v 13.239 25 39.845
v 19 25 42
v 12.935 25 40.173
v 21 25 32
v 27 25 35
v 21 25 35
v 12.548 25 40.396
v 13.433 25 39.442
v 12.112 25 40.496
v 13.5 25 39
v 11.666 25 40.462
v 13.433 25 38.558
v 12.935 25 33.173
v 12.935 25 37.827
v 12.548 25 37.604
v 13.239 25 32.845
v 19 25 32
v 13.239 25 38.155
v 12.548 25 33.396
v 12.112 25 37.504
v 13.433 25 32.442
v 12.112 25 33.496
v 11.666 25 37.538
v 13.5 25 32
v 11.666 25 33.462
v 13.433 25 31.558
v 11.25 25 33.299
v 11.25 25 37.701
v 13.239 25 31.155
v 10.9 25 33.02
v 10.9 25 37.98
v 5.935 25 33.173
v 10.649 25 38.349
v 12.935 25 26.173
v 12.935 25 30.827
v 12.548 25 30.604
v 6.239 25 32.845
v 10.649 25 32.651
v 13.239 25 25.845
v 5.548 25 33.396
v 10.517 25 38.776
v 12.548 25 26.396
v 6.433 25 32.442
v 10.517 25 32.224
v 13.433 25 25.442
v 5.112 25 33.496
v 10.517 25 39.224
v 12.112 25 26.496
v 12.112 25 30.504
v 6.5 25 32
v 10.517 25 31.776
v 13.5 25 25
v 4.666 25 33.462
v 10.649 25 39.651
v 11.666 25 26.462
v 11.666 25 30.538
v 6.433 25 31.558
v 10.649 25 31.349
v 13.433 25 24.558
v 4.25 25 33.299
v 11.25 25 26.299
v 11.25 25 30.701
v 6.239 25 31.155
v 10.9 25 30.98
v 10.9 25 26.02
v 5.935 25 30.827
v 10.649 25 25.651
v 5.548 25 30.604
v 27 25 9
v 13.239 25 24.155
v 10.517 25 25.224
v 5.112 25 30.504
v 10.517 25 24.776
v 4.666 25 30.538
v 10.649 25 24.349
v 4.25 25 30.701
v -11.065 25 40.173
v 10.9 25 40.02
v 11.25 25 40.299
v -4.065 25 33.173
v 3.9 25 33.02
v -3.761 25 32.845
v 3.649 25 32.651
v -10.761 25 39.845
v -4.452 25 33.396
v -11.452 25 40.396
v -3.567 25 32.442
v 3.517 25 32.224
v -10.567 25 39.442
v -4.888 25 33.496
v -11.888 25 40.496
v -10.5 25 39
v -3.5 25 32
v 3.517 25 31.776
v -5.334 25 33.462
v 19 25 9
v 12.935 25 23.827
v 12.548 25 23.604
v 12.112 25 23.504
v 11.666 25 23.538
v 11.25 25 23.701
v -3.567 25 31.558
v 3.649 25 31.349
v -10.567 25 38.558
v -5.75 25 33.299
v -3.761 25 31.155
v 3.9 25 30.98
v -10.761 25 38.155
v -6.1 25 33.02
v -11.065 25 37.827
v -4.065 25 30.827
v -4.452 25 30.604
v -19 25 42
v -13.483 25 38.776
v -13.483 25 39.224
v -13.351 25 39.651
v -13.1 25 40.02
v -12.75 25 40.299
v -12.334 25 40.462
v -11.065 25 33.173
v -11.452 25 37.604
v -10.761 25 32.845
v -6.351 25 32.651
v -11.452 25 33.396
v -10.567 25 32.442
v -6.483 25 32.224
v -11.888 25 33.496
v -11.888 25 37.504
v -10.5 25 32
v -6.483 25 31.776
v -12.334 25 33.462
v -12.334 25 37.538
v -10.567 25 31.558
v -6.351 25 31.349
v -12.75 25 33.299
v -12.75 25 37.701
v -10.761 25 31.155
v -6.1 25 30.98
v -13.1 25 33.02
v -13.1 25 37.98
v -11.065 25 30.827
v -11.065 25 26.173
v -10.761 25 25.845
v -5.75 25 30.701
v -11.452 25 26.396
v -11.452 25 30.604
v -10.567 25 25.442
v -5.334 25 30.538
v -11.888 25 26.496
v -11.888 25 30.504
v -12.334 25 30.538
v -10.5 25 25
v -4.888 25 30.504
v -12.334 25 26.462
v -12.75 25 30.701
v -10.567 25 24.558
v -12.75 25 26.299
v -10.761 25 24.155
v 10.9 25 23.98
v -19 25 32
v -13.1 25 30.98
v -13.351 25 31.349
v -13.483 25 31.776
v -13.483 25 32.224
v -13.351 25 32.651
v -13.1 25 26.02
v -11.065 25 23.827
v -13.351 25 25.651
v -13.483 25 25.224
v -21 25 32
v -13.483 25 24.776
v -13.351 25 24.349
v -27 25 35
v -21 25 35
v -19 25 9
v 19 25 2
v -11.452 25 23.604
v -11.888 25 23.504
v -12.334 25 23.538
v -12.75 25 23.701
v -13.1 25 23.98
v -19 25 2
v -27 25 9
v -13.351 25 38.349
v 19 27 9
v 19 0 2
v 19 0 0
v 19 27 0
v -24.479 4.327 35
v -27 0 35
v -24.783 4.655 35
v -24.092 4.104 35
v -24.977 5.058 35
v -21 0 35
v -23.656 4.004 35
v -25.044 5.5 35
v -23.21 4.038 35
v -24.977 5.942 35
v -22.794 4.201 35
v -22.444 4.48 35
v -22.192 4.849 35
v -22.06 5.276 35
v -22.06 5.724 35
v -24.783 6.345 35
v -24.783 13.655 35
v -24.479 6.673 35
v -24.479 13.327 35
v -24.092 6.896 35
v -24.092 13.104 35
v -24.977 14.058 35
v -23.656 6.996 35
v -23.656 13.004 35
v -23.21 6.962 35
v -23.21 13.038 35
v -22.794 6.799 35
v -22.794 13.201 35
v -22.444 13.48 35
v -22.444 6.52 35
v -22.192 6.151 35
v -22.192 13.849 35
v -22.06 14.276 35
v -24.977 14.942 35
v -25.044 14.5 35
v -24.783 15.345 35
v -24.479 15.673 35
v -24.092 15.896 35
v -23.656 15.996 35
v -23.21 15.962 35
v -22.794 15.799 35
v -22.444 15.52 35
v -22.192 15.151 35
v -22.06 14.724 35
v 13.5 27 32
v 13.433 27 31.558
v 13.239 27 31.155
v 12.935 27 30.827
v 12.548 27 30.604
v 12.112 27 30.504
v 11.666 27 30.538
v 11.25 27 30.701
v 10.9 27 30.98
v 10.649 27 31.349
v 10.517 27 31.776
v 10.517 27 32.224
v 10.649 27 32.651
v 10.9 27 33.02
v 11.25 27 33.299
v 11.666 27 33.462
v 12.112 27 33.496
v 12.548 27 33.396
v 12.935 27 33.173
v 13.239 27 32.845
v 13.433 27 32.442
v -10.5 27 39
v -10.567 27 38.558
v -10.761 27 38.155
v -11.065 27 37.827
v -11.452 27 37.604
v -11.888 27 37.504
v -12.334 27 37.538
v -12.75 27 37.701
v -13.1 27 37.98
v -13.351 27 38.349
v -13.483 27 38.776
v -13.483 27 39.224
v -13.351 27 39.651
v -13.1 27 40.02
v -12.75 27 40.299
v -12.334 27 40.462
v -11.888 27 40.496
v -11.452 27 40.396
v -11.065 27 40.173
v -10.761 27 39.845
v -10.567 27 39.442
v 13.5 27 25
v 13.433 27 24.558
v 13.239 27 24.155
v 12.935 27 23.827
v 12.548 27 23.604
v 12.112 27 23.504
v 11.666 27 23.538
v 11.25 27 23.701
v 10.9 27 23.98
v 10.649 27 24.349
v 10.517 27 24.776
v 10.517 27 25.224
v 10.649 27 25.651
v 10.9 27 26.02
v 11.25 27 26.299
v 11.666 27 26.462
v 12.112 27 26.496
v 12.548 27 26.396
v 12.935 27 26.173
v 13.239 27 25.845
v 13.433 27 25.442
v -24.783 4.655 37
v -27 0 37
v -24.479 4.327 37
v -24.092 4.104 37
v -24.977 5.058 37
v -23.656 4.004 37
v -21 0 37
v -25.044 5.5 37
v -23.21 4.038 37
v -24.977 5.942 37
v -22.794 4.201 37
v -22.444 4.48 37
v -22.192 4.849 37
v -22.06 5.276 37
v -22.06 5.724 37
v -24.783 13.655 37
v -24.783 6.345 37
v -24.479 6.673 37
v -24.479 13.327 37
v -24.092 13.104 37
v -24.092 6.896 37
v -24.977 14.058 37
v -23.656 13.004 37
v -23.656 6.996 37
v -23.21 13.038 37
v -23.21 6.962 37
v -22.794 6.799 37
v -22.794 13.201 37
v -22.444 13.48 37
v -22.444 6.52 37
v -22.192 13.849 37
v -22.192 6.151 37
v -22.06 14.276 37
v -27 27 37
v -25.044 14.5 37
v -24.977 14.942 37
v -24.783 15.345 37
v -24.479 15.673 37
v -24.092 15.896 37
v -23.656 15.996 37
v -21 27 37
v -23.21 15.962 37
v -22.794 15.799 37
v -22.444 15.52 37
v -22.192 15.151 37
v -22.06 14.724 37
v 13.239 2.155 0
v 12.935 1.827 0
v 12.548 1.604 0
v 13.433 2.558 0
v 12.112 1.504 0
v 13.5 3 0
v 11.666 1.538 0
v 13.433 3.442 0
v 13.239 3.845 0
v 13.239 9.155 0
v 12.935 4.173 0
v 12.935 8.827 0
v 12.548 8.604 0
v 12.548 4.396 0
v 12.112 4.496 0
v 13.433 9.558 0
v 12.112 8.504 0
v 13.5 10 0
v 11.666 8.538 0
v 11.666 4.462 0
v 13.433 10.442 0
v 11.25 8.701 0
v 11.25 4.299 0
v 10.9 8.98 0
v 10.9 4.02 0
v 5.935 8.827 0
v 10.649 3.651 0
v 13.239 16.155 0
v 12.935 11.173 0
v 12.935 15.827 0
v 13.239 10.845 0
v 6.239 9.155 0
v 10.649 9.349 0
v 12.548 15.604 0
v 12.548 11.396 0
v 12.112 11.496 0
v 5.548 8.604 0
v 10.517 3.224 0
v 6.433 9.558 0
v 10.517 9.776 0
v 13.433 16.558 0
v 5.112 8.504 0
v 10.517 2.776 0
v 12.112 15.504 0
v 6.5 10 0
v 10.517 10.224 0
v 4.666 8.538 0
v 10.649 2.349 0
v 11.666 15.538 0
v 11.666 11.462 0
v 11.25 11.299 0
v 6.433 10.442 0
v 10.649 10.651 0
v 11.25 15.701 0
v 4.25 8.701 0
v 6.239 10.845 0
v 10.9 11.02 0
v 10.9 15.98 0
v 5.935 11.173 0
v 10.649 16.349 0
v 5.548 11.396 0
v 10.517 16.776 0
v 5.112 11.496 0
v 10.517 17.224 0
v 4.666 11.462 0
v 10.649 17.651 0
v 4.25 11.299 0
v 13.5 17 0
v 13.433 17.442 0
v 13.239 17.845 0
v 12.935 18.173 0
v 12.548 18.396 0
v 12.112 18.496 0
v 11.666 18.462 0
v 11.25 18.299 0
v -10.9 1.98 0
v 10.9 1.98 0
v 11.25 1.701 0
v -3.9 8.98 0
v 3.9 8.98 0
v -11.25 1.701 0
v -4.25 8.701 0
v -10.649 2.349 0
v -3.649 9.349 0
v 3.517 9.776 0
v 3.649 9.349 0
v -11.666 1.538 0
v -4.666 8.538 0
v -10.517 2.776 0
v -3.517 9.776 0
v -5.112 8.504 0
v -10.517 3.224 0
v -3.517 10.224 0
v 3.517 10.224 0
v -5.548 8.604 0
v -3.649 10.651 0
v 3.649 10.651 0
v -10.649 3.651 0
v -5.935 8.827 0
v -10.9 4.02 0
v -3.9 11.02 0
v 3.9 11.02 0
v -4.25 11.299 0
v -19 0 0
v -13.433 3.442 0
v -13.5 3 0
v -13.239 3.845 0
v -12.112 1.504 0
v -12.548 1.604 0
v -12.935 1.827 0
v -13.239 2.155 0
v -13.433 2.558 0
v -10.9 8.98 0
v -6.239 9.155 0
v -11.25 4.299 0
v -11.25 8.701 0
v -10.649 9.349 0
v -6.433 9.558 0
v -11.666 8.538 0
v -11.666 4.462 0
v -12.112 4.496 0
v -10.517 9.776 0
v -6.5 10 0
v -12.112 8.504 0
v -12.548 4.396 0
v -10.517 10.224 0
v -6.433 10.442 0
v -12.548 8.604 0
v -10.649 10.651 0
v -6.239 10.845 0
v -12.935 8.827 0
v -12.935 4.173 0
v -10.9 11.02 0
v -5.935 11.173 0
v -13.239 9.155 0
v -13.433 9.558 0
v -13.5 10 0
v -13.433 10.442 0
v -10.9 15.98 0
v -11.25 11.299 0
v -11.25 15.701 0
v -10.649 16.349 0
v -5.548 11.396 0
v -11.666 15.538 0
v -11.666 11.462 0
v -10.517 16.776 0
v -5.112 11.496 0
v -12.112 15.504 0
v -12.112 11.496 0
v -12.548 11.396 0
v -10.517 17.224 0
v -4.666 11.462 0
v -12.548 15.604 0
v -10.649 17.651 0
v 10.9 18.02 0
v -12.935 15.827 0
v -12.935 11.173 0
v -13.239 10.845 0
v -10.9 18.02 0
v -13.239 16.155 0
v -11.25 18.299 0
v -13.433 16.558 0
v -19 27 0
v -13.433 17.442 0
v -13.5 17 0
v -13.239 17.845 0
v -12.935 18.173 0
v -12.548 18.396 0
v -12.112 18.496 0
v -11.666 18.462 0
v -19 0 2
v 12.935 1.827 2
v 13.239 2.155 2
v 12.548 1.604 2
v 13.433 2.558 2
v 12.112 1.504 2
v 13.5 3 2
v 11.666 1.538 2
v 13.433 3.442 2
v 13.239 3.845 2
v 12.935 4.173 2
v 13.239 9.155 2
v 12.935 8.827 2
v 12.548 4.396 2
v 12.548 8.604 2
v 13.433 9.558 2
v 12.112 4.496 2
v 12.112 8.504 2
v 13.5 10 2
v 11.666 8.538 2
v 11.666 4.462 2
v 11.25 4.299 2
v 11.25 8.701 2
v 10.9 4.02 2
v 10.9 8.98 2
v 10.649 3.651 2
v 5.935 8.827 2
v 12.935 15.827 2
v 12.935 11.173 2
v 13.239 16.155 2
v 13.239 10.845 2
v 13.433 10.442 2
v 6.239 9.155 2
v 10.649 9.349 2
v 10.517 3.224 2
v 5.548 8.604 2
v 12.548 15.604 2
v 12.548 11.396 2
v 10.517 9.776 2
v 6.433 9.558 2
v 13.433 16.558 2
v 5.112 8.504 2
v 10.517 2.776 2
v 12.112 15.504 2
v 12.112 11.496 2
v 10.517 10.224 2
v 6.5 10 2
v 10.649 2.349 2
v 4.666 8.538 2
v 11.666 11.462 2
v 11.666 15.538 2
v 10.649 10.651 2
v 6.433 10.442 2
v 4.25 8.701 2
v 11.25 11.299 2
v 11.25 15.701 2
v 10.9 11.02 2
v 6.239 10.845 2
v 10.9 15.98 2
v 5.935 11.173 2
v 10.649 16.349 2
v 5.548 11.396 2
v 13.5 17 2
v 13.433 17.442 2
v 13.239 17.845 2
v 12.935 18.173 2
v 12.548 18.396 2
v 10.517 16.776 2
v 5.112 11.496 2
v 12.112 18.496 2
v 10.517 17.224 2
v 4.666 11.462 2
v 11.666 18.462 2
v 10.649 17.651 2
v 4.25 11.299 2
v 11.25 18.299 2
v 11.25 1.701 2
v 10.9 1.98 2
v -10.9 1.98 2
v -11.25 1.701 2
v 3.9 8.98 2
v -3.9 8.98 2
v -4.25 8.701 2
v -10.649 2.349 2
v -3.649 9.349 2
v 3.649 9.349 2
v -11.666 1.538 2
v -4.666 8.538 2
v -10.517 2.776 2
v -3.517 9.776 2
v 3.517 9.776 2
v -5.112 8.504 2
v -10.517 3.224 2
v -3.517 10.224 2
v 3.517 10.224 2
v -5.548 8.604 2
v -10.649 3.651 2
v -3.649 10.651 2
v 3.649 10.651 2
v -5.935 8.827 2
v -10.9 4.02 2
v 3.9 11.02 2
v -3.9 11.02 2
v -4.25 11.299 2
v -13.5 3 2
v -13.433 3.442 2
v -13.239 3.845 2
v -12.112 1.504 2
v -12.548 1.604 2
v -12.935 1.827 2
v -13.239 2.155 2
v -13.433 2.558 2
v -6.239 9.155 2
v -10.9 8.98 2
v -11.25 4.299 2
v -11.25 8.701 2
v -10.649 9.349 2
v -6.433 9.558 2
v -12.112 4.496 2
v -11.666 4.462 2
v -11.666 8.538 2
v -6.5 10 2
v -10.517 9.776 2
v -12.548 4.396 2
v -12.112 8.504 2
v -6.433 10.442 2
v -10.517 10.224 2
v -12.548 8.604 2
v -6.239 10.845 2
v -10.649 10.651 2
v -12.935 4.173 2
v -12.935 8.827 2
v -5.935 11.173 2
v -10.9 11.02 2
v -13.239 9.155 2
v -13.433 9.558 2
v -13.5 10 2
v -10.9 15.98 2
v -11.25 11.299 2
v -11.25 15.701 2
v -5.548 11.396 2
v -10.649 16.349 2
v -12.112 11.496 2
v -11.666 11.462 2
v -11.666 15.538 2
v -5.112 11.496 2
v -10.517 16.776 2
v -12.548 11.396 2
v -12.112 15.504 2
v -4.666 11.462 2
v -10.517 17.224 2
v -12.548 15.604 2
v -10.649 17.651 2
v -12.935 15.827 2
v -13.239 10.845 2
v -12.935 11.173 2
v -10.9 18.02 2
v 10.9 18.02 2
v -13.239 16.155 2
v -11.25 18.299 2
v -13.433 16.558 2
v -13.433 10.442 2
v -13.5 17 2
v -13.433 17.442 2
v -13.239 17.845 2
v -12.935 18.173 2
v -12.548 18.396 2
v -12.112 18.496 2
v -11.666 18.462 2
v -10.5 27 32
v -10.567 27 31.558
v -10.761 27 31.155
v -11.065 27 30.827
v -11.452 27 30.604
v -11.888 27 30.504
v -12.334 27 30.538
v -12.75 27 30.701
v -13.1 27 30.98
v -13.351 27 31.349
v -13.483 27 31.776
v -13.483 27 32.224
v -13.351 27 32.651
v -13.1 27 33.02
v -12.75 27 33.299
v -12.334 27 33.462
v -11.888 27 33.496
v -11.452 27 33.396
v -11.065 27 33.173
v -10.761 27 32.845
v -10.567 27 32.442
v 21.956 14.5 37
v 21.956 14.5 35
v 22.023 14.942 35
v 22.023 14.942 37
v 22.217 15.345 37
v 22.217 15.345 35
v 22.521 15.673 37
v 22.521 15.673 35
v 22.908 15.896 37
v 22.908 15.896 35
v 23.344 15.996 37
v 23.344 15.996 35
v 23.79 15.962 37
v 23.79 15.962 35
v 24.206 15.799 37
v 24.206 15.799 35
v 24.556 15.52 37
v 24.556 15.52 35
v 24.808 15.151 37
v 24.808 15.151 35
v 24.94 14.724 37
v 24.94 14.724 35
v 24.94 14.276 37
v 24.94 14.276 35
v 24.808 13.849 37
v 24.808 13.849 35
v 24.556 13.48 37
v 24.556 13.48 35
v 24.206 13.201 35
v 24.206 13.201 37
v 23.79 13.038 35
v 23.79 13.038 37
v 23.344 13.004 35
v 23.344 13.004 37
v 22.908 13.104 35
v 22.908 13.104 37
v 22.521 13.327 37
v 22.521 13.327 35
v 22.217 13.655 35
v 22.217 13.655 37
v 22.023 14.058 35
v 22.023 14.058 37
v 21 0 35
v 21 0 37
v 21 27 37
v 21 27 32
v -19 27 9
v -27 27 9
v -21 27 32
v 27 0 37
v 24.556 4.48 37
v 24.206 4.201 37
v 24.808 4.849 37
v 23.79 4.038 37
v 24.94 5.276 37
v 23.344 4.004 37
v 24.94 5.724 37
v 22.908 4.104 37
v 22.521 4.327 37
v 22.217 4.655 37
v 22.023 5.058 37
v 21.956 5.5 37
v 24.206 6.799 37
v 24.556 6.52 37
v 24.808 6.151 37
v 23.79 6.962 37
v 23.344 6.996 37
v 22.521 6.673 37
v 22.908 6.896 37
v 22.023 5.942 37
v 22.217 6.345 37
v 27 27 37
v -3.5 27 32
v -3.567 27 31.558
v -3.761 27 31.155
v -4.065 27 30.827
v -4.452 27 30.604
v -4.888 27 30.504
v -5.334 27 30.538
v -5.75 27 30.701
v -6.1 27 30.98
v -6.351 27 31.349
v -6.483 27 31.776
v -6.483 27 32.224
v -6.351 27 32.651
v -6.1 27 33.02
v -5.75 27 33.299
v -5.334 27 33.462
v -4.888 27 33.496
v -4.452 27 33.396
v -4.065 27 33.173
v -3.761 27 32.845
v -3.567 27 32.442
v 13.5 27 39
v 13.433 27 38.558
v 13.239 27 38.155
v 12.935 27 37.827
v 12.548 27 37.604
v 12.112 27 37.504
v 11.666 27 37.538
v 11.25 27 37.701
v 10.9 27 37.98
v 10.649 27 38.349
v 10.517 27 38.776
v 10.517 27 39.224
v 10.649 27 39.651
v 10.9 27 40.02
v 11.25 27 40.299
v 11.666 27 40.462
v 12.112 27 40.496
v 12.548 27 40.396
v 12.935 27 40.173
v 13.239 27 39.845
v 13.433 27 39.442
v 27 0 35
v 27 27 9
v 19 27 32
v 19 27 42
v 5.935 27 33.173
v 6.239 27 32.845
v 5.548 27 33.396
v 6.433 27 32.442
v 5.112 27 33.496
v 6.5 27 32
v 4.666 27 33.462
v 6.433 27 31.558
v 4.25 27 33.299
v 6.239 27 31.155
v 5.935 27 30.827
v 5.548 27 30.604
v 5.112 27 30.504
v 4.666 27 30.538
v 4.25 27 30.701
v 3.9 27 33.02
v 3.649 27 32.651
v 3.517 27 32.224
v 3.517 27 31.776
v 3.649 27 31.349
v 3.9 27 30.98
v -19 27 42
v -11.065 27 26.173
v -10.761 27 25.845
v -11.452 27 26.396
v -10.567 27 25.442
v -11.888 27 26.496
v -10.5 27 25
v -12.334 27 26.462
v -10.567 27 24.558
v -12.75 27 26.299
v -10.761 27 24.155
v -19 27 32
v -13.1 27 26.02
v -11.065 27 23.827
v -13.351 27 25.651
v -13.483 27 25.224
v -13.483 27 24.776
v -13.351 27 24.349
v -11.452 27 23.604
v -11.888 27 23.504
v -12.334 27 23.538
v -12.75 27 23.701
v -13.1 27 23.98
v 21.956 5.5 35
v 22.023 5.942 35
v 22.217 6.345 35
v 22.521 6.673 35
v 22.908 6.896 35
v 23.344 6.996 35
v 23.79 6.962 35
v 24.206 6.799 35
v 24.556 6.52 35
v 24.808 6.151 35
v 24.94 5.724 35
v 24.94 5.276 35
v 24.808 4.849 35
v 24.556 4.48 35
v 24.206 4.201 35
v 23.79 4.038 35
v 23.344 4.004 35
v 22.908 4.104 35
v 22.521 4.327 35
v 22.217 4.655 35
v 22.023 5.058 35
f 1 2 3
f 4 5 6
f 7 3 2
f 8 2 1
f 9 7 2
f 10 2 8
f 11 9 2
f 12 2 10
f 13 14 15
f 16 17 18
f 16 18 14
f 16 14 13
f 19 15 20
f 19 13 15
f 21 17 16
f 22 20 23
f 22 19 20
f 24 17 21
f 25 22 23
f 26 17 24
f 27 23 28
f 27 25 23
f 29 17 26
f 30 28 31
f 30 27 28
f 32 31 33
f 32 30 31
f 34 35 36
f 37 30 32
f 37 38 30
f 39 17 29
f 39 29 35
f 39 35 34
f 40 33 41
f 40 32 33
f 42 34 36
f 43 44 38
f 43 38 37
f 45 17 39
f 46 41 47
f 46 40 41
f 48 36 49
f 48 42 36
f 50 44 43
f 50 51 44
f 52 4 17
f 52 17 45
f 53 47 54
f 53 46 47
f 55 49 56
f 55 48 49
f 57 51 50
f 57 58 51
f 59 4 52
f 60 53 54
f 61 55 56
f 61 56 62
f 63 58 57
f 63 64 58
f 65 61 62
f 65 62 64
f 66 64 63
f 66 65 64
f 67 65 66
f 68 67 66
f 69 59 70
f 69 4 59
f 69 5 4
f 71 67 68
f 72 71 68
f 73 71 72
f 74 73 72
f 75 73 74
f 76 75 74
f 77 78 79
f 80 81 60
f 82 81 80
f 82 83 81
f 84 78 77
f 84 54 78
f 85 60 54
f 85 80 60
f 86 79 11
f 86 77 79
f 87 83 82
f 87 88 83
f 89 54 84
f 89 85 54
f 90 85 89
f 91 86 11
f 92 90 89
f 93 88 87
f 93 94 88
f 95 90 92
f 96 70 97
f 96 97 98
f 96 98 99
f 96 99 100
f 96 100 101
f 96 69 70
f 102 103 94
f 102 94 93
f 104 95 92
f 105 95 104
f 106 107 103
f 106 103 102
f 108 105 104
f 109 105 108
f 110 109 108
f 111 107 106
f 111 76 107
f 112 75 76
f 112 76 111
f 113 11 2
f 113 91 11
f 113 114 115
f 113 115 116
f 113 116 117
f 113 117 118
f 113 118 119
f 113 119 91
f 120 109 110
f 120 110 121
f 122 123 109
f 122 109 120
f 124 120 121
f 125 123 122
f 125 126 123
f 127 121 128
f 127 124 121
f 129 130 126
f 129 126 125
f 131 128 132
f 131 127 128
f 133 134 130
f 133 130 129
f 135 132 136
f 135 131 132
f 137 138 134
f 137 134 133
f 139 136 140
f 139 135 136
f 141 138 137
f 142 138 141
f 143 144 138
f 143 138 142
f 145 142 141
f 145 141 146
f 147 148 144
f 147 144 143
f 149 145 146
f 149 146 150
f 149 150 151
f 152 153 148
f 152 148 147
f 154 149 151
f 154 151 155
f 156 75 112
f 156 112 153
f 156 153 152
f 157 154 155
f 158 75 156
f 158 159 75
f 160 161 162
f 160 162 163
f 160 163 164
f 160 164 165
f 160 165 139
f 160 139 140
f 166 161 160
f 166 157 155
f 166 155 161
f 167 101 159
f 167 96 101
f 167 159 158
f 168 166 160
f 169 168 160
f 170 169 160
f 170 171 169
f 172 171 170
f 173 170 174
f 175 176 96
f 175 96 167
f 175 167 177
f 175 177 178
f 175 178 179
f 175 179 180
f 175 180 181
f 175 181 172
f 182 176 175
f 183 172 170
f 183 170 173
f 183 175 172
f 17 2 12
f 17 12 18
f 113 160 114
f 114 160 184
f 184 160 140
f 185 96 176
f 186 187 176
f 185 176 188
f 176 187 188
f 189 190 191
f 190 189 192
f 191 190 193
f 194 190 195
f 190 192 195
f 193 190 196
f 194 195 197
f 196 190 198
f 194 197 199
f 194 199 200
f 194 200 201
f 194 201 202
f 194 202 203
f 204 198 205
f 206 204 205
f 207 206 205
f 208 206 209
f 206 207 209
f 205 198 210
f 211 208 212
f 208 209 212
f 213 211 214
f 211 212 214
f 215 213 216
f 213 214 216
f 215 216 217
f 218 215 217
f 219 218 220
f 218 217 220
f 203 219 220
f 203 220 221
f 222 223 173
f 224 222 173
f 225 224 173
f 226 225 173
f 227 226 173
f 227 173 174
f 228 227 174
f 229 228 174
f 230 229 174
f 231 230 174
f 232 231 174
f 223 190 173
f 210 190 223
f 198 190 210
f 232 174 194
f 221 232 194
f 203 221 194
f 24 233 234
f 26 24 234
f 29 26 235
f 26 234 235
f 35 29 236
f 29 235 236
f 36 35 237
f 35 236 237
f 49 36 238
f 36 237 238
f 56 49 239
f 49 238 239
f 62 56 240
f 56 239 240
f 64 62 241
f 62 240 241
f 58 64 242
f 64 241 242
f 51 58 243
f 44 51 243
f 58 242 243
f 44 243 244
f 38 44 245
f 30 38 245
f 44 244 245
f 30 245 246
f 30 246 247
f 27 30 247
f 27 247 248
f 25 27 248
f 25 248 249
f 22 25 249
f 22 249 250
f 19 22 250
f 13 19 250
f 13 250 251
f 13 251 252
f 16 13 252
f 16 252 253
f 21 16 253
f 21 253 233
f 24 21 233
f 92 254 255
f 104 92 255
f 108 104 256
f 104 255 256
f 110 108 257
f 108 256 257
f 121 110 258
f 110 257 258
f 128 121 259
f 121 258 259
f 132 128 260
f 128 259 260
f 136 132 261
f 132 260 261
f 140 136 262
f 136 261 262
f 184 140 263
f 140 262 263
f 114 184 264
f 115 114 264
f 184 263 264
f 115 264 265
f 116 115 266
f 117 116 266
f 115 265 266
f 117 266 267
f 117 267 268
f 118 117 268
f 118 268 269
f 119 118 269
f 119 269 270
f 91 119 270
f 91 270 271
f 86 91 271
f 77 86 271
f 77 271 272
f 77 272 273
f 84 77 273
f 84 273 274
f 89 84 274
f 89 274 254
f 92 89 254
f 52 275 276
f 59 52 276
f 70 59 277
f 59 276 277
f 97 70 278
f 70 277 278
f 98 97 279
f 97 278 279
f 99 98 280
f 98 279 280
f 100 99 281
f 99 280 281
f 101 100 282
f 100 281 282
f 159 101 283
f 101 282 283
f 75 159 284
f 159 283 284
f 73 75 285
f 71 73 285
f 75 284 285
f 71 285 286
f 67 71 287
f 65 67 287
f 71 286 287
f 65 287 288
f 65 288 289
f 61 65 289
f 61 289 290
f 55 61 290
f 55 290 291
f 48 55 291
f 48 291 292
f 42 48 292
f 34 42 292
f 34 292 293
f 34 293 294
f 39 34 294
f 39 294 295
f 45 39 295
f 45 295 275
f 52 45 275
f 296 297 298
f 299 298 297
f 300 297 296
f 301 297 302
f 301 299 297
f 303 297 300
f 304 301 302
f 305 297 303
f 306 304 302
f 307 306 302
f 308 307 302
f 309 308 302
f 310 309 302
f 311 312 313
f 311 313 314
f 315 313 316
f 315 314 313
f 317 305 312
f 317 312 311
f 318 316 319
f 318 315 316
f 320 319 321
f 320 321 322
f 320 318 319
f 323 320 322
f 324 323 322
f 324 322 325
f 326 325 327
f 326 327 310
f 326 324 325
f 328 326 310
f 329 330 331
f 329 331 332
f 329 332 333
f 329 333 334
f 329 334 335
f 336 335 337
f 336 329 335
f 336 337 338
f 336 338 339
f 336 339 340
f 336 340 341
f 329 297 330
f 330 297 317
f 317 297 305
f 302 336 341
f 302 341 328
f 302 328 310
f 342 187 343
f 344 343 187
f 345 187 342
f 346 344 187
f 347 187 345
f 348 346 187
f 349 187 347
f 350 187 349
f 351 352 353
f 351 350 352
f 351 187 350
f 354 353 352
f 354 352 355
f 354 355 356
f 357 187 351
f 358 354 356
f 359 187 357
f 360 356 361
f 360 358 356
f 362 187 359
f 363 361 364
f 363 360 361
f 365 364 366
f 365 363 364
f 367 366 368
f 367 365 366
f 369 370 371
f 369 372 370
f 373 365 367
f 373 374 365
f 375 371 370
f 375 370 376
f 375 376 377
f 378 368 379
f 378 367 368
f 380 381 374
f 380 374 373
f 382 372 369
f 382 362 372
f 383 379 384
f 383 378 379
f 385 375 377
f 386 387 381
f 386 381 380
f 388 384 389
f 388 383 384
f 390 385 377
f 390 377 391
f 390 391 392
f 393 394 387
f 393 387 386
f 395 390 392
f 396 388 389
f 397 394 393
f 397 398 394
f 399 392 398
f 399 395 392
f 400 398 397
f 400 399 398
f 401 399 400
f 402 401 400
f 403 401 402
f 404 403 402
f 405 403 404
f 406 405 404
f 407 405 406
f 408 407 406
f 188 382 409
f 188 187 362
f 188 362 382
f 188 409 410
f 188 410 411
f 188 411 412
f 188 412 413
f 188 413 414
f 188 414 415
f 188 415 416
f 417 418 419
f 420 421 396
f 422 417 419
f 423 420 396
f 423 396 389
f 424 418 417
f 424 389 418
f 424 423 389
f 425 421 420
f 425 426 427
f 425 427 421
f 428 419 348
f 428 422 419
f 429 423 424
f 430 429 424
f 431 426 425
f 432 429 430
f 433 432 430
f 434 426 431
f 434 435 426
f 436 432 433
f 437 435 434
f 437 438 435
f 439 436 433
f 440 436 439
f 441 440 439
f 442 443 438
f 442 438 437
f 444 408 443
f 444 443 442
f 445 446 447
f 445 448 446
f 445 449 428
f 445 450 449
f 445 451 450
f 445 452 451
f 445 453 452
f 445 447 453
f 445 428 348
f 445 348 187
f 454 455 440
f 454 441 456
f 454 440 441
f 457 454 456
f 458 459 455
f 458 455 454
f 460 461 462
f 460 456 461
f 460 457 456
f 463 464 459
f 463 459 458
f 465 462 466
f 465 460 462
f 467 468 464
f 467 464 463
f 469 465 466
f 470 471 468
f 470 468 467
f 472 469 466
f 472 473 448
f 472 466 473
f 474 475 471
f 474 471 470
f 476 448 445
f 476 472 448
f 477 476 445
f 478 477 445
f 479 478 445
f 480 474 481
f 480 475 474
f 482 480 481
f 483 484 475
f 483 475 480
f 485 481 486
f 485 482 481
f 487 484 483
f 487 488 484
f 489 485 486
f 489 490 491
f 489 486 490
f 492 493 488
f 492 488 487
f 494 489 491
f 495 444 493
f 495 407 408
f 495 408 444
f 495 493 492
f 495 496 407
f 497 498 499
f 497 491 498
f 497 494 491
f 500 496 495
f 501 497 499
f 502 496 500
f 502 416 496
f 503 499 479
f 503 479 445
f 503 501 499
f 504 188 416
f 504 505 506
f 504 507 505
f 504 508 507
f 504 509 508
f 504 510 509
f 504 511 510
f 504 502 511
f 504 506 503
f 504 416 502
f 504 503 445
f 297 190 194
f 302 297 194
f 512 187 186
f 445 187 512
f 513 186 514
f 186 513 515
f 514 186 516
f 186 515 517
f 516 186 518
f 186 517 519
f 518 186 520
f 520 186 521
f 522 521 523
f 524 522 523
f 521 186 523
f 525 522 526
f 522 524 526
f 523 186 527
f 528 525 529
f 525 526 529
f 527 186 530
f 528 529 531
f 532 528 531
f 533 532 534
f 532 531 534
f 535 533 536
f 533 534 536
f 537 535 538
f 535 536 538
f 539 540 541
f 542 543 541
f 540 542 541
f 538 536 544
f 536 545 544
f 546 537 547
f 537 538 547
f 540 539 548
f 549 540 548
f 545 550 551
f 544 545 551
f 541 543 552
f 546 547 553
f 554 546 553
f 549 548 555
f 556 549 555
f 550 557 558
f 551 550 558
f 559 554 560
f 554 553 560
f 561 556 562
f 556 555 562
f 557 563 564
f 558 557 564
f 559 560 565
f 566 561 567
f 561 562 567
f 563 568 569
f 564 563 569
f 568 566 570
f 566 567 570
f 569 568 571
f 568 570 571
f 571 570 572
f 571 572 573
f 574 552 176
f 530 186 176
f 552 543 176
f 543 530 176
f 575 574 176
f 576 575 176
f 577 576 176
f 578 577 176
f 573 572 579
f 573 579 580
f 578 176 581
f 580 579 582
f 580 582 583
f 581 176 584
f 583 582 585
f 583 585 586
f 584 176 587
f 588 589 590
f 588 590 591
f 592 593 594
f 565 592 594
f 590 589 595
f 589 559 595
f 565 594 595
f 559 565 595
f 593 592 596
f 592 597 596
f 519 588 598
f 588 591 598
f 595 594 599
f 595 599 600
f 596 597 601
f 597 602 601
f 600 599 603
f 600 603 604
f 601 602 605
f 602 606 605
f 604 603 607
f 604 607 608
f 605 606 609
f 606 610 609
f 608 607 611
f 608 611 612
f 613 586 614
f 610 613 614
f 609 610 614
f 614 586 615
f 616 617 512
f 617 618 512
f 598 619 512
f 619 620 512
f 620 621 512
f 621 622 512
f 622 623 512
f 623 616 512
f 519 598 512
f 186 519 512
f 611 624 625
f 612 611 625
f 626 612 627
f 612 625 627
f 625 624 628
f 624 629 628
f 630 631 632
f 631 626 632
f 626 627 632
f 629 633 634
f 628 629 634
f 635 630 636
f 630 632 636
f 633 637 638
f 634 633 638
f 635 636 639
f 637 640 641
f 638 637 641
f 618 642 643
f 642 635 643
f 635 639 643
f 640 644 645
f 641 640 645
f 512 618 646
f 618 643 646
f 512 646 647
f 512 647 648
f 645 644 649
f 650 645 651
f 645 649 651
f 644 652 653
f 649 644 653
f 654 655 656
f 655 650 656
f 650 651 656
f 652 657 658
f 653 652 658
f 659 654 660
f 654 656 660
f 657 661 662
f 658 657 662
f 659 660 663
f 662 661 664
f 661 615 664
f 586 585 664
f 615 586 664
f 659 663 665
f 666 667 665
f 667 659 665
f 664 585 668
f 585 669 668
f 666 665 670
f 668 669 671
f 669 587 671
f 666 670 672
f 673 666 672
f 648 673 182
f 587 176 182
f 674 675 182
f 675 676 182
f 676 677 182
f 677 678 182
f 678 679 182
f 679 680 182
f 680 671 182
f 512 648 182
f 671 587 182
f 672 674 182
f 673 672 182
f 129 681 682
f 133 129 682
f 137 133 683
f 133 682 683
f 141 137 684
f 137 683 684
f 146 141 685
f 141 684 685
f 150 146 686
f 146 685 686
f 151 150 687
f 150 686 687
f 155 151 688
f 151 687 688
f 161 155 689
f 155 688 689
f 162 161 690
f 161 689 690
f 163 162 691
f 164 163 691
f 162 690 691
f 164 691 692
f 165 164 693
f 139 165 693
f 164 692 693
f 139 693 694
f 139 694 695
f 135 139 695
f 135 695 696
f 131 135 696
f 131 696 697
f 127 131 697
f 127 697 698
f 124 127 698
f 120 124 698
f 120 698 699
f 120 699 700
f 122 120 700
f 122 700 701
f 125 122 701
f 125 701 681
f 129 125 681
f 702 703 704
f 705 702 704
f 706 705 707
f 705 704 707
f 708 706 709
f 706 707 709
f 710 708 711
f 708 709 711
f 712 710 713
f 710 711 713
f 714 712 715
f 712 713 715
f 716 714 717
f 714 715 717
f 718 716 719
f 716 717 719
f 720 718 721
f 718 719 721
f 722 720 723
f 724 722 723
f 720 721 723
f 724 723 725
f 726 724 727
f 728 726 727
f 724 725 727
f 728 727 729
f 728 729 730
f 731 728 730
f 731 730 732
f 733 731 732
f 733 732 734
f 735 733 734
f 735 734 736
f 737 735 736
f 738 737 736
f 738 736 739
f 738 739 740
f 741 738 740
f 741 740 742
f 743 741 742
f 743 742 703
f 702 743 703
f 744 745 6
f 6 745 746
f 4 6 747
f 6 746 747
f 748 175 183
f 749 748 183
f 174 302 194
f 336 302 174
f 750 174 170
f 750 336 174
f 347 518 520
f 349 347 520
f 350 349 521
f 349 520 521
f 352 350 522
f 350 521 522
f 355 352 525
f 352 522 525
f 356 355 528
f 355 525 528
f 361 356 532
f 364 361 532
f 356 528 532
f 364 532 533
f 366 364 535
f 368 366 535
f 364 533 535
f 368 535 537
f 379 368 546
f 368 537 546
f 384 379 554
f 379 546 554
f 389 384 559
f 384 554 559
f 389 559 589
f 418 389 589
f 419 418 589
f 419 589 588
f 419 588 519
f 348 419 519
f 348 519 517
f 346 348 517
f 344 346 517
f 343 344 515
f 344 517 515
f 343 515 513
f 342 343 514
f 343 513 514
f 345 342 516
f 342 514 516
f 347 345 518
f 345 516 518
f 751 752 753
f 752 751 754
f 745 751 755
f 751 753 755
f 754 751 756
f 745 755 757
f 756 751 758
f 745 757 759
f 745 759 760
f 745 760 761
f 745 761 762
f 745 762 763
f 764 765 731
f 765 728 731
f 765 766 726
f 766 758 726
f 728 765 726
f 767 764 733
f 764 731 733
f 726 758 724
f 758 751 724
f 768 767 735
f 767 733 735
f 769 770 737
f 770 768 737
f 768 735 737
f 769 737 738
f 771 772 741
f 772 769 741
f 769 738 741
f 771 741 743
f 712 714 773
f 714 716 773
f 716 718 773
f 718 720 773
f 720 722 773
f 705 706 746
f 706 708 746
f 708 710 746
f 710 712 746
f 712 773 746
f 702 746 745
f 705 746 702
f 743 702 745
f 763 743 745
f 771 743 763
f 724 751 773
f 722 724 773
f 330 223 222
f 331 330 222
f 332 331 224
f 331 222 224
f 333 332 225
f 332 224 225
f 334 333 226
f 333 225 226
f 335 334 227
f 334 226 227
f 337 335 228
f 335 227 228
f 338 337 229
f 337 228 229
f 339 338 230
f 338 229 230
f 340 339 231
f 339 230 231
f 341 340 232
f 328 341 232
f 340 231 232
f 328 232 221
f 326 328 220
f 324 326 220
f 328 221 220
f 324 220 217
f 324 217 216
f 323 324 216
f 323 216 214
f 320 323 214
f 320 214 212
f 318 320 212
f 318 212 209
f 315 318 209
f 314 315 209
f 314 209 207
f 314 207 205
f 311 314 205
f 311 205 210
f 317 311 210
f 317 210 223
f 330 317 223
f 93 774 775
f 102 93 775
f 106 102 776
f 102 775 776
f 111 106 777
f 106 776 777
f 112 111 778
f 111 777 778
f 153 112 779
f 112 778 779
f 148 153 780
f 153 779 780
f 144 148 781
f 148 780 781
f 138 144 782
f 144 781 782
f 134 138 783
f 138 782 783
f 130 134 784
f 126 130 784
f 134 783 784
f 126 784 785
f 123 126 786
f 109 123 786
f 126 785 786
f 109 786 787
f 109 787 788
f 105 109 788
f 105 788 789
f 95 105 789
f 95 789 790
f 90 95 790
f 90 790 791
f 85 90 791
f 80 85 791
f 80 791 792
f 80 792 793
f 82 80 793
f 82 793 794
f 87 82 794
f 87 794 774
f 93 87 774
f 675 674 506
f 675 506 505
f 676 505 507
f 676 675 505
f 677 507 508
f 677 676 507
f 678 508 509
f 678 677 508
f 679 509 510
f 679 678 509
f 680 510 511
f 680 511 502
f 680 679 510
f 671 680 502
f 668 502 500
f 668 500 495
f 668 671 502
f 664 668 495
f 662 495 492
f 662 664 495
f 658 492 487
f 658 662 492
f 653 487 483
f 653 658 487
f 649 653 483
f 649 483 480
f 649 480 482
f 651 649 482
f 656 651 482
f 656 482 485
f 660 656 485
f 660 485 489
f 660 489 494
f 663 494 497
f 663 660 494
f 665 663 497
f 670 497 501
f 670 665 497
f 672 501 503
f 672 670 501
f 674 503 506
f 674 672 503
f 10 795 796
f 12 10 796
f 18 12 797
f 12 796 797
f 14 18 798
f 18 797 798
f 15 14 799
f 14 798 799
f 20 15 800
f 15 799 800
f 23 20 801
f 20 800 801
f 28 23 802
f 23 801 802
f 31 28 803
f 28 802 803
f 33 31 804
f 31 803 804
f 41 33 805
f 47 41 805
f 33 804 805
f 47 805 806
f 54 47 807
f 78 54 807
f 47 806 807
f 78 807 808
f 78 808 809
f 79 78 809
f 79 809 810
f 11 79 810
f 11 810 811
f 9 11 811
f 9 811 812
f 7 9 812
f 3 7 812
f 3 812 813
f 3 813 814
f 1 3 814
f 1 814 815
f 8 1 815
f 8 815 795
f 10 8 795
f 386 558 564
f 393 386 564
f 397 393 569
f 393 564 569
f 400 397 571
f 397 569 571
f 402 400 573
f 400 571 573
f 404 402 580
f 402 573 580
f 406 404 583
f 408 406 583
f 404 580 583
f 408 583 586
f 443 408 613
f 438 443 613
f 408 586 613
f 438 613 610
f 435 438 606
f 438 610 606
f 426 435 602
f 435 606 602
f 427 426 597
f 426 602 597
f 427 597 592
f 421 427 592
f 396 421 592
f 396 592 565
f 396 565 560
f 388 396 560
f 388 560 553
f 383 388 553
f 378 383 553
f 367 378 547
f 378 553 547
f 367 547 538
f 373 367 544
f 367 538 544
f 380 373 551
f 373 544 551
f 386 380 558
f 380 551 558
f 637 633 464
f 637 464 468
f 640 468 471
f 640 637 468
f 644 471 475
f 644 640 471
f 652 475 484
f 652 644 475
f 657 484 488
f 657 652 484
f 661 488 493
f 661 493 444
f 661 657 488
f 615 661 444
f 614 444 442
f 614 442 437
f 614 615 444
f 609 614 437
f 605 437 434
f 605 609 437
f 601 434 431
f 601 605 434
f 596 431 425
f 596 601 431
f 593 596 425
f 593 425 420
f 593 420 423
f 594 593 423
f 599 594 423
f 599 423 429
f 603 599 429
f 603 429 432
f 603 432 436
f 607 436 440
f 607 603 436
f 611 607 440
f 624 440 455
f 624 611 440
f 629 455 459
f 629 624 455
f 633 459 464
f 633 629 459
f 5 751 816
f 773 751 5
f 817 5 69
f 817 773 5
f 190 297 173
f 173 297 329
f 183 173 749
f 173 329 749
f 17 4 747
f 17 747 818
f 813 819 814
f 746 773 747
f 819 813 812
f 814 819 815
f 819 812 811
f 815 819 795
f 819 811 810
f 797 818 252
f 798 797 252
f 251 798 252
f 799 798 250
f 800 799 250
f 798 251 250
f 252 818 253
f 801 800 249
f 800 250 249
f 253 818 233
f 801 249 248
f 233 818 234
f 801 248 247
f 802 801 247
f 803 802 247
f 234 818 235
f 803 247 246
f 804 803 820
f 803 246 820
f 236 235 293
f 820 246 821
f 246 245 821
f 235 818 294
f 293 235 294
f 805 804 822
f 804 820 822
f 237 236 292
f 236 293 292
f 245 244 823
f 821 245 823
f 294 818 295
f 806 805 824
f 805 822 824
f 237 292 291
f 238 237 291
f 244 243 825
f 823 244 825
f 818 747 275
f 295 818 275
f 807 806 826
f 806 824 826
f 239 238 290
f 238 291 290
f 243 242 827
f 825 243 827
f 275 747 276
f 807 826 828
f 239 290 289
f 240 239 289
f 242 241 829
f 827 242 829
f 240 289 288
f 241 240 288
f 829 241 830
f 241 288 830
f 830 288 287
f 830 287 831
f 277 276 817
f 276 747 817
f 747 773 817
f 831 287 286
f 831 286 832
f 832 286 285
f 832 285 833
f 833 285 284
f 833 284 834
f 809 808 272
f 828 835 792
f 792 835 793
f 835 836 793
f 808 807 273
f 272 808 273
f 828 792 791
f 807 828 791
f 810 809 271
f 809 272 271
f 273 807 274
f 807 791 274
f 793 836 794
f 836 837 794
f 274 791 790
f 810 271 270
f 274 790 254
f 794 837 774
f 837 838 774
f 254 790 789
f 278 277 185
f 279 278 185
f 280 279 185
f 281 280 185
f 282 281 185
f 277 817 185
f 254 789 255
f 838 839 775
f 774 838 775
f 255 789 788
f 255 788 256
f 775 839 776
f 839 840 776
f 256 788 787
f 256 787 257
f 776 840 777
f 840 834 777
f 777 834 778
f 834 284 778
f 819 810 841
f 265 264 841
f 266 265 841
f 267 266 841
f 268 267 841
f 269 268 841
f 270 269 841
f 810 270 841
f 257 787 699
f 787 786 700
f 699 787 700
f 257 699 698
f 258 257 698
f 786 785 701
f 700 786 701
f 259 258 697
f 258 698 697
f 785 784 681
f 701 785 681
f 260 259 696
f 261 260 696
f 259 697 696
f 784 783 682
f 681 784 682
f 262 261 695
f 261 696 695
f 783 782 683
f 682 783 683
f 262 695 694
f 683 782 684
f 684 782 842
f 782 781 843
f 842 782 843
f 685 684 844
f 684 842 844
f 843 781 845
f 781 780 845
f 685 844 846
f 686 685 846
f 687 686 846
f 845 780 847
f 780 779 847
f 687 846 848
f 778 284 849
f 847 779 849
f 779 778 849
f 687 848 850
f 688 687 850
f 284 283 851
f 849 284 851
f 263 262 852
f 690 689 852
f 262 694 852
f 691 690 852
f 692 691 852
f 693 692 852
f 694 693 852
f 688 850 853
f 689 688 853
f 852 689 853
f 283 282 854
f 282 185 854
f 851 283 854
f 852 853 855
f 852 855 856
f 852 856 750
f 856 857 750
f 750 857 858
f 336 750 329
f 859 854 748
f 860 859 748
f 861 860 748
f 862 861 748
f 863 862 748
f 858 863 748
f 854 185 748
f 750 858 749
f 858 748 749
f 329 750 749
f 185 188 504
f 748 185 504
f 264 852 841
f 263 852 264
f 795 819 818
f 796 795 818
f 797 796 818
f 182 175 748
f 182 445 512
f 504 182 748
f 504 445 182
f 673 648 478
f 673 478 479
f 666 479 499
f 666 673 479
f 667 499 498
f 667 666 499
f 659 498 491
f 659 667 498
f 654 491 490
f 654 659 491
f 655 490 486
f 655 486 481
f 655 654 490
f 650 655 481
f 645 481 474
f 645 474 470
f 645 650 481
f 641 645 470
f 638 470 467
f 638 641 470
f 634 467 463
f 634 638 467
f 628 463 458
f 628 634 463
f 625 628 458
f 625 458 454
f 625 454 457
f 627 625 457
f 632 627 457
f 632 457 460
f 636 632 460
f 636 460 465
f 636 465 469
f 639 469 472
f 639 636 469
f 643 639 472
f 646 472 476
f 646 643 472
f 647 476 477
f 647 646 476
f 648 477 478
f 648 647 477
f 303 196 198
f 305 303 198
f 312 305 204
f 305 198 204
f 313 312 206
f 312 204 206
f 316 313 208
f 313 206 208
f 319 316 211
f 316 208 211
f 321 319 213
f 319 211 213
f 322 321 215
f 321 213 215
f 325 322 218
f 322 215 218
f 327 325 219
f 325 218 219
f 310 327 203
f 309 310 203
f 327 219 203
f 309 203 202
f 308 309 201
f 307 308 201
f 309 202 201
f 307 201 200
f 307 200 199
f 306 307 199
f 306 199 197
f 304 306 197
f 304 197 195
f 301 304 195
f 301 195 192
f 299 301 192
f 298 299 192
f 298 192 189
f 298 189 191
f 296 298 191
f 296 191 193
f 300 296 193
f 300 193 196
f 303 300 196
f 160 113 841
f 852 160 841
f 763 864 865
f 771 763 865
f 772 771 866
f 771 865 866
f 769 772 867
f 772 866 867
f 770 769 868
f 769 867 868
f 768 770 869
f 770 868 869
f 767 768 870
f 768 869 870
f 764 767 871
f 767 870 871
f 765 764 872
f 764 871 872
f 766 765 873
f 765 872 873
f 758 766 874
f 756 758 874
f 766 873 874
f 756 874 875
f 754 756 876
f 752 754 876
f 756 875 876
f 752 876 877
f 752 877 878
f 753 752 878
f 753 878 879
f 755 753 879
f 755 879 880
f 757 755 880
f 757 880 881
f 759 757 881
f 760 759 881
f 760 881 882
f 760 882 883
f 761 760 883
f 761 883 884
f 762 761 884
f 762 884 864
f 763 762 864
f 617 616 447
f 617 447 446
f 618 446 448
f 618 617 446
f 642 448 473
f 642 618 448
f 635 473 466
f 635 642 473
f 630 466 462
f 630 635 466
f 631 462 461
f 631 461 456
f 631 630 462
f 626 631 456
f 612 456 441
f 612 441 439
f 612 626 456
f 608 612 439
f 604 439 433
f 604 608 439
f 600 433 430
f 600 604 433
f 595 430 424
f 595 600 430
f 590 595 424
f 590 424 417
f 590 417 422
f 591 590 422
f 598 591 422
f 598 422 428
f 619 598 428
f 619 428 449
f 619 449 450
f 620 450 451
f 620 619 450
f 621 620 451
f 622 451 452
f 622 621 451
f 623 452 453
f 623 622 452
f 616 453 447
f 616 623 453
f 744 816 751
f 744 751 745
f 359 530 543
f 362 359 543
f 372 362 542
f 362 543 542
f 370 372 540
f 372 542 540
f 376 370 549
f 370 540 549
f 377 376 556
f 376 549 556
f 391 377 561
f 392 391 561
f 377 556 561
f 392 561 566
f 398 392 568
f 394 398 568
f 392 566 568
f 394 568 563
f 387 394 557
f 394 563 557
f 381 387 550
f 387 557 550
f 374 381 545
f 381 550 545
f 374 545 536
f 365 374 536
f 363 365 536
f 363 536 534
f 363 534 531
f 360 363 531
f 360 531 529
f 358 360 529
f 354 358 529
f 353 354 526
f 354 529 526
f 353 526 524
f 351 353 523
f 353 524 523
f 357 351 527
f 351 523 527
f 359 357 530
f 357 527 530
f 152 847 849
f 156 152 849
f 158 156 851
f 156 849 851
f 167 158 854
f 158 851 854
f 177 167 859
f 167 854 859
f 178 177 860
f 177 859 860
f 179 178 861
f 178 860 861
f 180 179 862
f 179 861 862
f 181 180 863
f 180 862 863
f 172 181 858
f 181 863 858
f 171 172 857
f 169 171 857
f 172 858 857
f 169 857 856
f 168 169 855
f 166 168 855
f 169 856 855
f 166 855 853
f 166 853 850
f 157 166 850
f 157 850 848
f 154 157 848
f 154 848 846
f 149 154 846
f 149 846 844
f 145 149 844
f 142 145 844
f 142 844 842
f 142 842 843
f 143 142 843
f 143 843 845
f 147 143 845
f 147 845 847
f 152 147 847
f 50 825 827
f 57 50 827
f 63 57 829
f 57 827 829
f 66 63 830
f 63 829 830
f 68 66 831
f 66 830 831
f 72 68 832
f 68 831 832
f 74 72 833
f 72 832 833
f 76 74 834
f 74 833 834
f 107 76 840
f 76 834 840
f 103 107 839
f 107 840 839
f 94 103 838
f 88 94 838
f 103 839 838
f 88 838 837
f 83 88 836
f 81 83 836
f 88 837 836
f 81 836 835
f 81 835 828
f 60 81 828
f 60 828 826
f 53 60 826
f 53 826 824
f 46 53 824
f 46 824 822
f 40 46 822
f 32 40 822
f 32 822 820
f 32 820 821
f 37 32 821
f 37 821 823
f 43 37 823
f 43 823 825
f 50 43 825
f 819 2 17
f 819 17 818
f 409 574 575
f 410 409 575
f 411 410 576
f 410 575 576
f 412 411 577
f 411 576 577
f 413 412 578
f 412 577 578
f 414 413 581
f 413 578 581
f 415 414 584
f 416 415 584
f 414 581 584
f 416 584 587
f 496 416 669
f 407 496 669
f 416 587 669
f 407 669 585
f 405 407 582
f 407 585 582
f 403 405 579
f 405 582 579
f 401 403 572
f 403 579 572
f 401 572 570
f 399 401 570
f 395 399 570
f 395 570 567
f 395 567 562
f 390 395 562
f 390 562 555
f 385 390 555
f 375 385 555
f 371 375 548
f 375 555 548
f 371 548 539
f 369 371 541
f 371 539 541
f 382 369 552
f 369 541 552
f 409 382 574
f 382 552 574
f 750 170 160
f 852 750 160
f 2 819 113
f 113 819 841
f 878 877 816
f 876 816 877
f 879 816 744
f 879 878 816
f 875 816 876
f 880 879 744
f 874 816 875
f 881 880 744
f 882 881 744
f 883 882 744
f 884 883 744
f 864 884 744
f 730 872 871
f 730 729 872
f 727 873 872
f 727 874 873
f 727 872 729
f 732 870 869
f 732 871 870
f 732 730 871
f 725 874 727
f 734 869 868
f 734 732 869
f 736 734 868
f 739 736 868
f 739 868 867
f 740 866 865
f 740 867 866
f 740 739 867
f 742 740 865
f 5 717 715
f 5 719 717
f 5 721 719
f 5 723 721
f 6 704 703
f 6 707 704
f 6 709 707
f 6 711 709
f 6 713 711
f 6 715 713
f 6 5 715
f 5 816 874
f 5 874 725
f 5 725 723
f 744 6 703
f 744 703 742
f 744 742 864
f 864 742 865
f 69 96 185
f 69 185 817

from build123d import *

# Parameters (mm, degrees)
SKETCH1_W           = 19
SKETCH1_H           = 27
BOSS_EXTRUDE1_DEPTH = 2
SKETCH2_W           = 19
SKETCH2_H           = 2
BOSS_EXTRUDE2_DEPTH = 40
BOSS_EXTRUDE3_DEPTH = 2
SKETCH5_W           = 6
SKETCH5_H           = 2
BOSS_EXTRUDE4_DEPTH = 25
SKETCH6_R           = 1.5
CUT_EXTRUDE1_DEPTH  = 2
CUT_EXTRUDE2_REACH  = 9
SKETCH7_R           = 1.5
CUT_EXTRUDE4_REACH  = 29
SKETCH9_R           = 1.5


with BuildPart() as part:
    # Sketch1 → Boss-Extrude1 (new body)
    with BuildSketch(Plane.XY):
        with Locations((9.5, 13.5)):
            Rectangle(SKETCH1_W, SKETCH1_H)
    boss_extrude1 = extrude(amount=BOSS_EXTRUDE1_DEPTH)

    # Sketch2 → Boss-Extrude2 (add)
    with BuildSketch(Plane.XY.offset(2)):
        with Locations((9.5, 26)):
            Rectangle(SKETCH2_W, SKETCH2_H)
    boss_extrude2 = extrude(amount=BOSS_EXTRUDE2_DEPTH)

    # Sketch3 → Boss-Extrude3 (add)
    with BuildSketch(Plane(origin=(0, 25, 0), x_dir=(-1, 0, 0), z_dir=(0, -1, 0))):
        Polygon((-19, -32), (-19, -9), (-27, -9), (-27, -37), (-21, -37), (-21, -32), align=None)
    boss_extrude3 = extrude(amount=-BOSS_EXTRUDE3_DEPTH)

    # Sketch5 → Boss-Extrude4 (add)
    with BuildSketch(Plane(origin=(0, 25, 0), x_dir=(-1, 0, 0), z_dir=(0, -1, 0))):
        with Locations((-24, -36)):
            Rectangle(SKETCH5_W, SKETCH5_H)
    boss_extrude4 = extrude(amount=BOSS_EXTRUDE4_DEPTH)

    # Sketch6 → Cut-Extrude1 (cut)
    with BuildSketch(Plane.XY.offset(2)):
        with Locations((12, 3)):
            Circle(SKETCH6_R)
        with Locations((12, 10)):
            Circle(SKETCH6_R)
        with Locations((12, 17)):
            Circle(SKETCH6_R)
        with Locations((5, 10)):
            Circle(SKETCH6_R)
    cut_extrude1 = extrude(amount=-CUT_EXTRUDE1_DEPTH, mode=Mode.SUBTRACT)

    # Mirror2: Boss-Extrude1, Boss-Extrude2, Boss-Extrude3, Boss-Extrude4, Cut-Extrude1 across plane
    add(boss_extrude1.mirror(Plane(origin=(0, 0, 2), x_dir=(0, 0, 1), z_dir=(1, 0, 0))))
    add(boss_extrude2.mirror(Plane(origin=(0, 0, 2), x_dir=(0, 0, 1), z_dir=(1, 0, 0))))
    add(boss_extrude3.mirror(Plane(origin=(0, 0, 2), x_dir=(0, 0, 1), z_dir=(1, 0, 0))))
    add(boss_extrude4.mirror(Plane(origin=(0, 0, 2), x_dir=(0, 0, 1), z_dir=(1, 0, 0))))
    add(cut_extrude1.mirror(Plane(origin=(0, 0, 2), x_dir=(0, 0, 1), z_dir=(1, 0, 0))), mode=Mode.SUBTRACT)

    # Sketch7 → Cut-Extrude2 (cut, up to next)
    with BuildSketch(Plane(origin=(0, 0, 35), x_dir=(-1, 0, 0), z_dir=(0, 0, -1)), mode=Mode.PRIVATE) as cut_extrude2_sk1:
        with Locations((-23.456279898, 5.5)):
            Circle(SKETCH7_R)
    cut_extrude2_tool1 = extrude(cut_extrude2_sk1.sketch, amount=-CUT_EXTRUDE2_REACH, mode=Mode.PRIVATE) & part.part
    add(cut_extrude2_tool1.solids().sort_by_distance((23.45628, 5.5, 35))[0], mode=Mode.SUBTRACT)
    # Sketch7 → Cut-Extrude2 (cut, up to next)
    with BuildSketch(Plane(origin=(0, 0, 35), x_dir=(-1, 0, 0), z_dir=(0, 0, -1)), mode=Mode.PRIVATE) as cut_extrude2_sk2:
        with Locations((-23.456279898, 14.5)):
            Circle(SKETCH7_R)
    cut_extrude2_tool2 = extrude(cut_extrude2_sk2.sketch, amount=-CUT_EXTRUDE2_REACH, mode=Mode.PRIVATE) & part.part
    add(cut_extrude2_tool2.solids().sort_by_distance((23.45628, 14.5, 35))[0], mode=Mode.SUBTRACT)
    # Sketch7 → Cut-Extrude2 (cut, up to next)
    with BuildSketch(Plane(origin=(0, 0, 35), x_dir=(-1, 0, 0), z_dir=(0, 0, -1)), mode=Mode.PRIVATE) as cut_extrude2_sk3:
        with Locations((23.543720102, 5.5)):
            Circle(SKETCH7_R)
    cut_extrude2_tool3 = extrude(cut_extrude2_sk3.sketch, amount=-CUT_EXTRUDE2_REACH, mode=Mode.PRIVATE) & part.part
    add(cut_extrude2_tool3.solids().sort_by_distance((-23.54372, 5.5, 35))[0], mode=Mode.SUBTRACT)
    # Sketch7 → Cut-Extrude2 (cut, up to next)
    with BuildSketch(Plane(origin=(0, 0, 35), x_dir=(-1, 0, 0), z_dir=(0, 0, -1)), mode=Mode.PRIVATE) as cut_extrude2_sk4:
        with Locations((23.543720102, 14.5)):
            Circle(SKETCH7_R)
    cut_extrude2_tool4 = extrude(cut_extrude2_sk4.sketch, amount=-CUT_EXTRUDE2_REACH, mode=Mode.PRIVATE) & part.part
    add(cut_extrude2_tool4.solids().sort_by_distance((-23.54372, 14.5, 35))[0], mode=Mode.SUBTRACT)

    # Sketch9 → Cut-Extrude4 (cut, up to next)
    with BuildSketch(Plane(origin=(0, 27, 0), x_dir=(1, 0, 0), z_dir=(0, 1, 0)), mode=Mode.PRIVATE) as cut_extrude4_sk1:
        with Locations((12, -32)):
            Circle(SKETCH9_R)
    cut_extrude4_tool1 = extrude(cut_extrude4_sk1.sketch, amount=-CUT_EXTRUDE4_REACH, mode=Mode.PRIVATE) & part.part
    add(cut_extrude4_tool1.solids().sort_by_distance((12, 27, 32))[0], mode=Mode.SUBTRACT)
    # Sketch9 → Cut-Extrude4 (cut, up to next)
    with BuildSketch(Plane(origin=(0, 27, 0), x_dir=(1, 0, 0), z_dir=(0, 1, 0)), mode=Mode.PRIVATE) as cut_extrude4_sk2:
        with Locations((12, -25)):
            Circle(SKETCH9_R)
    cut_extrude4_tool2 = extrude(cut_extrude4_sk2.sketch, amount=-CUT_EXTRUDE4_REACH, mode=Mode.PRIVATE) & part.part
    add(cut_extrude4_tool2.solids().sort_by_distance((12, 27, 25))[0], mode=Mode.SUBTRACT)
    # Sketch9 → Cut-Extrude4 (cut, up to next)
    with BuildSketch(Plane(origin=(0, 27, 0), x_dir=(1, 0, 0), z_dir=(0, 1, 0)), mode=Mode.PRIVATE) as cut_extrude4_sk3:
        with Locations((12, -39)):
            Circle(SKETCH9_R)
    cut_extrude4_tool3 = extrude(cut_extrude4_sk3.sketch, amount=-CUT_EXTRUDE4_REACH, mode=Mode.PRIVATE) & part.part
    add(cut_extrude4_tool3.solids().sort_by_distance((12, 27, 39))[0], mode=Mode.SUBTRACT)
    # Sketch9 → Cut-Extrude4 (cut, up to next)
    with BuildSketch(Plane(origin=(0, 27, 0), x_dir=(1, 0, 0), z_dir=(0, 1, 0)), mode=Mode.PRIVATE) as cut_extrude4_sk4:
        with Locations((5, -32)):
            Circle(SKETCH9_R)
    cut_extrude4_tool4 = extrude(cut_extrude4_sk4.sketch, amount=-CUT_EXTRUDE4_REACH, mode=Mode.PRIVATE) & part.part
    add(cut_extrude4_tool4.solids().sort_by_distance((5, 27, 32))[0], mode=Mode.SUBTRACT)
    # Sketch9 → Cut-Extrude4 (cut, up to next)
    with BuildSketch(Plane(origin=(0, 27, 0), x_dir=(1, 0, 0), z_dir=(0, 1, 0)), mode=Mode.PRIVATE) as cut_extrude4_sk5:
        with Locations((-5, -32)):
            Circle(SKETCH9_R)
    cut_extrude4_tool5 = extrude(cut_extrude4_sk5.sketch, amount=-CUT_EXTRUDE4_REACH, mode=Mode.PRIVATE) & part.part
    add(cut_extrude4_tool5.solids().sort_by_distance((-5, 27, 32))[0], mode=Mode.SUBTRACT)
    # Sketch9 → Cut-Extrude4 (cut, up to next)
    with BuildSketch(Plane(origin=(0, 27, 0), x_dir=(1, 0, 0), z_dir=(0, 1, 0)), mode=Mode.PRIVATE) as cut_extrude4_sk6:
        with Locations((-12, -32)):
            Circle(SKETCH9_R)
    cut_extrude4_tool6 = extrude(cut_extrude4_sk6.sketch, amount=-CUT_EXTRUDE4_REACH, mode=Mode.PRIVATE) & part.part
    add(cut_extrude4_tool6.solids().sort_by_distance((-12, 27, 32))[0], mode=Mode.SUBTRACT)
    # Sketch9 → Cut-Extrude4 (cut, up to next)
    with BuildSketch(Plane(origin=(0, 27, 0), x_dir=(1, 0, 0), z_dir=(0, 1, 0)), mode=Mode.PRIVATE) as cut_extrude4_sk7:
        with Locations((-12, -39)):
            Circle(SKETCH9_R)
    cut_extrude4_tool7 = extrude(cut_extrude4_sk7.sketch, amount=-CUT_EXTRUDE4_REACH, mode=Mode.PRIVATE) & part.part
    add(cut_extrude4_tool7.solids().sort_by_distance((-12, 27, 39))[0], mode=Mode.SUBTRACT)
    # Sketch9 → Cut-Extrude4 (cut, up to next)
    with BuildSketch(Plane(origin=(0, 27, 0), x_dir=(1, 0, 0), z_dir=(0, 1, 0)), mode=Mode.PRIVATE) as cut_extrude4_sk8:
        with Locations((-12, -25)):
            Circle(SKETCH9_R)
    cut_extrude4_tool8 = extrude(cut_extrude4_sk8.sketch, amount=-CUT_EXTRUDE4_REACH, mode=Mode.PRIVATE) & part.part
    add(cut_extrude4_tool8.solids().sort_by_distance((-12, 27, 25))[0], mode=Mode.SUBTRACT)


solid = part.part
